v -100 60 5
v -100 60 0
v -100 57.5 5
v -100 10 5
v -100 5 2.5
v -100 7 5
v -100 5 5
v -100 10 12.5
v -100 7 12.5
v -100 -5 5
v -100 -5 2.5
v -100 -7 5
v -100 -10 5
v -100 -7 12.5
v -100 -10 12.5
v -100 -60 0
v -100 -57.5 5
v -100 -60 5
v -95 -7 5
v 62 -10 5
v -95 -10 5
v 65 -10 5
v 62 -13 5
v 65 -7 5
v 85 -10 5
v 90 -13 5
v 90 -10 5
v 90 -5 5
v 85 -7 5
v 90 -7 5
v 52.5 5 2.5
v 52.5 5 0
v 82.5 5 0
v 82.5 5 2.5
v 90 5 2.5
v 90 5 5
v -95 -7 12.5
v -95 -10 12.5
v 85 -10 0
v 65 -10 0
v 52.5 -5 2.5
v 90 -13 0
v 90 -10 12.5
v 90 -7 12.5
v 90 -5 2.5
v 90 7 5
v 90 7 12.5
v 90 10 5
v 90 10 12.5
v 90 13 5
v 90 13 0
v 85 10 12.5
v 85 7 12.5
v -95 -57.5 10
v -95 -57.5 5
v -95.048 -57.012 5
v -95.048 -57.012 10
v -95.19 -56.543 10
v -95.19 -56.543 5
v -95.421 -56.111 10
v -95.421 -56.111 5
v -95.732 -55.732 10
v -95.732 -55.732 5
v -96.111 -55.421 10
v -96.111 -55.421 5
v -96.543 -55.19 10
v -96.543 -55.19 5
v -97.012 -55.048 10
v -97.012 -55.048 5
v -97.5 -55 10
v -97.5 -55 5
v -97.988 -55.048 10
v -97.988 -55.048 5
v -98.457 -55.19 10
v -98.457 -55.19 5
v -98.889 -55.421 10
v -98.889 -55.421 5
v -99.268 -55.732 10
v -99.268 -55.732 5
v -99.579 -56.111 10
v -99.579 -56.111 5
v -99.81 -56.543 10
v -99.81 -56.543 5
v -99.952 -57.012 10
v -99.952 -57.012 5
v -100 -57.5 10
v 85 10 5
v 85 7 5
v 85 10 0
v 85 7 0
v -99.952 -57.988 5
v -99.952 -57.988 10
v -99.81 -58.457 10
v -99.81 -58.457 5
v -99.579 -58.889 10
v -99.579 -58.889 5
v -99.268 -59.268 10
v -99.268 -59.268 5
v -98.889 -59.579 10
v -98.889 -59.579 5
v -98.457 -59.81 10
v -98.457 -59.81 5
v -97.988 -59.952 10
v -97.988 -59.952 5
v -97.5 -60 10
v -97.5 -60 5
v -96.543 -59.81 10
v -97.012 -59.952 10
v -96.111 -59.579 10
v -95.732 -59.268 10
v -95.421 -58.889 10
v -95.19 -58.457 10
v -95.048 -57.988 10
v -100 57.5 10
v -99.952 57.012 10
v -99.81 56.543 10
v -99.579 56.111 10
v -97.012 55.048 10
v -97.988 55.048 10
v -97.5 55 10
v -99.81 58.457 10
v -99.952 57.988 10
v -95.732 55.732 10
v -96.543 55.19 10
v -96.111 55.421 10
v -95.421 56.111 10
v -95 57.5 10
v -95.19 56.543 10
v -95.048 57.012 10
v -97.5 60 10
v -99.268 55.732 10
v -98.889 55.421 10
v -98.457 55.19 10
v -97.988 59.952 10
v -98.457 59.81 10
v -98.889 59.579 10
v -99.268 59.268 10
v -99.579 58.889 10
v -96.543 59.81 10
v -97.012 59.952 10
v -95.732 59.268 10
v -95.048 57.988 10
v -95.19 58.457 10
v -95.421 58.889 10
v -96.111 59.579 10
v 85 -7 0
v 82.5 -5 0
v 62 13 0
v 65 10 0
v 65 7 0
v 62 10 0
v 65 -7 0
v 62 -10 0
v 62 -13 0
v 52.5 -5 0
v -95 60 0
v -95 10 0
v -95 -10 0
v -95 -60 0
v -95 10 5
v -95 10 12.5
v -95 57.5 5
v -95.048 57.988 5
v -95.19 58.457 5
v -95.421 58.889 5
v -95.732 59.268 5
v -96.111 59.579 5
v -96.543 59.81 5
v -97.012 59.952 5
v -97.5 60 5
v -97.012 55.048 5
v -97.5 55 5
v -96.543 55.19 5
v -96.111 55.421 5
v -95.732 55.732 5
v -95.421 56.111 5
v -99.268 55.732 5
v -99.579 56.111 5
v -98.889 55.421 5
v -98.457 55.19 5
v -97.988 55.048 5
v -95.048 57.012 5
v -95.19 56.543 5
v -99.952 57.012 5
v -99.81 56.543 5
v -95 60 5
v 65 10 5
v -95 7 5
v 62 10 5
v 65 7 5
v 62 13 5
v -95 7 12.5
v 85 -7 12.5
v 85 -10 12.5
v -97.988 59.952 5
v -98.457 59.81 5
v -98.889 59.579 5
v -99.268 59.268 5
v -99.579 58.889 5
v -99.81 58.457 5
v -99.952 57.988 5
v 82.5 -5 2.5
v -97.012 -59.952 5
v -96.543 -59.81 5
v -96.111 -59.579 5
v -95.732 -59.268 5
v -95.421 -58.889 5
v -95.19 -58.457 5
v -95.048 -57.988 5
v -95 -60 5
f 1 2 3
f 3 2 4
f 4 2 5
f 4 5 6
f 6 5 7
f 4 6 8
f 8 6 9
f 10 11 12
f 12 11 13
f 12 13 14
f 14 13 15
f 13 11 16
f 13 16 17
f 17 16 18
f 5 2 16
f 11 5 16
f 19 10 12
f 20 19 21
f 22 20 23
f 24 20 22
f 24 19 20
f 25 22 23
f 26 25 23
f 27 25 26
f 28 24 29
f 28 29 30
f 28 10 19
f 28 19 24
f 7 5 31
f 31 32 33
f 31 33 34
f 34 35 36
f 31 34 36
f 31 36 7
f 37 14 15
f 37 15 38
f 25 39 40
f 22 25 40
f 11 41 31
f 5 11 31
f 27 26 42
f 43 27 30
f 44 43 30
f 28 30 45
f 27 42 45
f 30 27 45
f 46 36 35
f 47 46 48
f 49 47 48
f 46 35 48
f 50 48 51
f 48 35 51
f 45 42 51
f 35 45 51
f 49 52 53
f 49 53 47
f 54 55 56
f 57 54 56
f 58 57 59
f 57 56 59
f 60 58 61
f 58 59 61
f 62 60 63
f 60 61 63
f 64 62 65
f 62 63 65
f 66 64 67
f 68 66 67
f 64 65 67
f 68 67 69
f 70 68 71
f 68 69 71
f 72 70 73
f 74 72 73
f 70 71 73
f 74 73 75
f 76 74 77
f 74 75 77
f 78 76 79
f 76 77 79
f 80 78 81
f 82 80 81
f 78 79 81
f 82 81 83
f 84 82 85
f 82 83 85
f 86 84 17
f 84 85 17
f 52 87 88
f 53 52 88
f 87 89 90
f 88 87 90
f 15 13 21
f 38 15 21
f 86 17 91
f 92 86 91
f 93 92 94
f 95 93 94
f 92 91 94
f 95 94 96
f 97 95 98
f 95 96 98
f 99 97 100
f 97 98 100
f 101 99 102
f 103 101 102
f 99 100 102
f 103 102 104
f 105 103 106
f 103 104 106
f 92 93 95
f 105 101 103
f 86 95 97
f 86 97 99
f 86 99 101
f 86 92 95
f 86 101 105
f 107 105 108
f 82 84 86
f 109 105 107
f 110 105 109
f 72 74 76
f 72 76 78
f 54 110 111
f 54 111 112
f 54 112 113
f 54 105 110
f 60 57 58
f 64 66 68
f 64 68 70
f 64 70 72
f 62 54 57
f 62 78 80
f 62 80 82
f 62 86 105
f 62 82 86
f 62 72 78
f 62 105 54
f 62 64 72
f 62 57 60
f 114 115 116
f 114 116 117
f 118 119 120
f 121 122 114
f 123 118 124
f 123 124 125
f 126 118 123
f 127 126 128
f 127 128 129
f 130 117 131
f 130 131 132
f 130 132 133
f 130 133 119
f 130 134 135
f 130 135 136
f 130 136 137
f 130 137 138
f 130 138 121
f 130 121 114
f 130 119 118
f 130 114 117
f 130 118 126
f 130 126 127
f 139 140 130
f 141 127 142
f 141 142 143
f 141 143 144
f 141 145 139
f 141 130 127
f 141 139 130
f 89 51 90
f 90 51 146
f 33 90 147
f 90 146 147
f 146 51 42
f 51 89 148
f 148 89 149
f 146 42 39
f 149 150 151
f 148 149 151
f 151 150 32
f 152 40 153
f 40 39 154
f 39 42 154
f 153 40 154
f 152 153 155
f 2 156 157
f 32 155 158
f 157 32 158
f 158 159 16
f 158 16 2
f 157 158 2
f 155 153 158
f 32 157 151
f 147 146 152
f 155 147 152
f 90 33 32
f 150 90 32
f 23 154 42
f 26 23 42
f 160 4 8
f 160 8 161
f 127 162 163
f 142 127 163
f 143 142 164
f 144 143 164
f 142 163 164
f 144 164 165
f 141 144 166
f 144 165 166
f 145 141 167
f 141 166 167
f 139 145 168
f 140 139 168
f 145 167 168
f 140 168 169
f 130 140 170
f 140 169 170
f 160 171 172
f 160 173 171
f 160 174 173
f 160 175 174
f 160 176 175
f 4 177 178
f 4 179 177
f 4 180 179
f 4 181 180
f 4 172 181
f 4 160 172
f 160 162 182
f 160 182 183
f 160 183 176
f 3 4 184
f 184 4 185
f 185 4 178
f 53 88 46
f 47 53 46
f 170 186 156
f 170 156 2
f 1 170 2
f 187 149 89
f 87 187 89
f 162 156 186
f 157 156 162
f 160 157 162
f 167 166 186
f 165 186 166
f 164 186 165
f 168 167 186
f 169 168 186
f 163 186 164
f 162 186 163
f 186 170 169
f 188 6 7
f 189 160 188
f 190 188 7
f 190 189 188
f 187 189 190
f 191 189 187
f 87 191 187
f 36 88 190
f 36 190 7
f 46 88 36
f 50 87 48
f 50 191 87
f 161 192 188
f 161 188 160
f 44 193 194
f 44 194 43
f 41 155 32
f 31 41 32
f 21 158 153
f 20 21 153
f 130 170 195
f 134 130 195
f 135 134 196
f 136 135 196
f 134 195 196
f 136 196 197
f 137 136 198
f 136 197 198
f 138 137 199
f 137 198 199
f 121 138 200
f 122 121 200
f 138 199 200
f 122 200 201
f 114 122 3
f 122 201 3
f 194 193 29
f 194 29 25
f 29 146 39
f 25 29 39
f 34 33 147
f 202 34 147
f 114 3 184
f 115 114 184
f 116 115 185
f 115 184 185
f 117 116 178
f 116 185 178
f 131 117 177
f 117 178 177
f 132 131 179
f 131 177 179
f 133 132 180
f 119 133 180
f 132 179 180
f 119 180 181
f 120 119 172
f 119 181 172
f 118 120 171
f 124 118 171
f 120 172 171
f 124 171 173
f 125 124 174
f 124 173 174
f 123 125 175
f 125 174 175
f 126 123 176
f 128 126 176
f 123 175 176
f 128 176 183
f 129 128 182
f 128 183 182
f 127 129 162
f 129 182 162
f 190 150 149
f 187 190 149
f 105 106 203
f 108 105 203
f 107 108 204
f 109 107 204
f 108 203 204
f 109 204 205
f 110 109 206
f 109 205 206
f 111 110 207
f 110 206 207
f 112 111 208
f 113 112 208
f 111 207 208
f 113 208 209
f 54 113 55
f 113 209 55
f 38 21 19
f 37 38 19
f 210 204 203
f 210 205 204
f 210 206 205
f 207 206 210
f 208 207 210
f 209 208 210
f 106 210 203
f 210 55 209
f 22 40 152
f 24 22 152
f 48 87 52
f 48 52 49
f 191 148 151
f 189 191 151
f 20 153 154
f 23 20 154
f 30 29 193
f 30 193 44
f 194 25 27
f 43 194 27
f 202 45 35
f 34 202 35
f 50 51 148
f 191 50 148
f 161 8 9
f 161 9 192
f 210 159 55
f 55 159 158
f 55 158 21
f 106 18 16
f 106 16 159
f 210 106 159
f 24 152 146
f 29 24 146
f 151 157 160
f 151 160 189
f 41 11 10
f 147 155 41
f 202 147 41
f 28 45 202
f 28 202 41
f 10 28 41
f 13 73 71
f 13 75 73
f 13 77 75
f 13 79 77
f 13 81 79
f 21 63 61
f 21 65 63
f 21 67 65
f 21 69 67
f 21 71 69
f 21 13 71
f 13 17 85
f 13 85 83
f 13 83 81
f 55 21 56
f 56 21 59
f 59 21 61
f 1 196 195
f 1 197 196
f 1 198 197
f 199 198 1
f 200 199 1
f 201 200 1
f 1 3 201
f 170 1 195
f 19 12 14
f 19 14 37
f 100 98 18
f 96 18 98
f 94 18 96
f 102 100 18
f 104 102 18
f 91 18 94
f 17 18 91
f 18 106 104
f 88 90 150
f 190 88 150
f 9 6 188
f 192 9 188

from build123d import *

# Parameters (mm, degrees)
F1_DEPTH  = 5
F2_W      = 10
F2_H      = 2.5
F3_DEPTH  = 200
F4_W      = 5
F4_H      = 3
F5_DEPTH  = 7.5
F6_W      = 5
F6_H      = 5
F7_DEPTH  = 50
F8_W      = 5
F8_H      = 5
F9_DEPTH  = 50
F12_DEPTH = 5


# Not quite as in the source:
# - a feature names something its author has since deleted; it is built from what else it names


with BuildPart() as f1:
    # F0 (on Top) → F1 (new body)
    with BuildSketch(Plane.XY):
        Polygon((-100, 10), (-100, 0), (-100, -10), (62, -10), (65, -10), (65, -7), (85, -7), (85, -10), (90, -10), (90, 0), (90, 10), (85, 10), (85, 7), (65, 7), (65, 10), (62, 10), align=None)
        Polygon((82.5, 5), (82.5, 0), (82.5, -5), (52.5, -5), (52.5, 0), (52.5, 5), align=None, mode=Mode.SUBTRACT)
        Polygon((65, -10), (62, -10), (62, -13), (90, -13), (90, -10), (85, -10), align=None)
        Polygon((62, 13), (62, 10), (65, 10), (85, 10), (90, 10), (90, 13), align=None)
    extrude(amount=F1_DEPTH)

    # F2 (on face) → F3 (cut)
    with BuildSketch(Plane.YZ.offset(90)):
        with Locations((0, 3.75)):
            Rectangle(F2_W, F2_H)
    extrude(amount=-F3_DEPTH, mode=Mode.SUBTRACT)

    # F4 (on face) → F5 (join)
    with BuildSketch(Plane.XY.offset(5)):
        with Locations((-97.5, 8.5)):
            Rectangle(F4_W, F4_H)
        with Locations((-97.5, -8.5)):
            Rectangle(F4_W, F4_H)
        with Locations((87.5, -8.5)):
            Rectangle(F4_W, F4_H)
        with Locations((87.5, 8.5)):
            Rectangle(F4_W, F4_H)
    extrude(amount=F5_DEPTH)

    # F6 (on face) → F7 (join)
    with BuildSketch(Plane.XZ.offset(10)):
        with Locations((-97.5, 2.5)):
            Rectangle(F6_W, F6_H)
    extrude(amount=F7_DEPTH)

    # F8 (on face) → F9 (join)
    with BuildSketch(Plane(origin=(0, 10, 0), x_dir=(-1, 0, 0), z_dir=(0, 1, 0))):
        with Locations((97.5, 2.5)):
            Rectangle(F8_W, F8_H)
    extrude(amount=F9_DEPTH)

    # F10 (on face) + F11 (on face) → F12 (join)
    with BuildSketch(Plane.XY.offset(5)):
        with BuildLine():
            ThreePointArc((-100, -57.5), (-99.267766953, -59.267766953), (-97.5, -60))
            ThreePointArc((-97.5, -60), (-95.732233047, -59.267766953), (-95, -57.5))
            ThreePointArc((-95, -57.5), (-97.5, -55), (-100, -57.5))
        make_face()
    with BuildSketch(Plane.XY.offset(5)):
        with BuildLine():
            ThreePointArc((-100, 57.5), (-97.5, 55), (-95, 57.5))
            ThreePointArc((-95, 57.5), (-95.732233047, 59.267766953), (-97.5, 60))
            ThreePointArc((-97.5, 60), (-99.267766953, 59.267766953), (-100, 57.5))
        make_face()
    extrude(amount=F12_DEPTH)


solid = f1.part
